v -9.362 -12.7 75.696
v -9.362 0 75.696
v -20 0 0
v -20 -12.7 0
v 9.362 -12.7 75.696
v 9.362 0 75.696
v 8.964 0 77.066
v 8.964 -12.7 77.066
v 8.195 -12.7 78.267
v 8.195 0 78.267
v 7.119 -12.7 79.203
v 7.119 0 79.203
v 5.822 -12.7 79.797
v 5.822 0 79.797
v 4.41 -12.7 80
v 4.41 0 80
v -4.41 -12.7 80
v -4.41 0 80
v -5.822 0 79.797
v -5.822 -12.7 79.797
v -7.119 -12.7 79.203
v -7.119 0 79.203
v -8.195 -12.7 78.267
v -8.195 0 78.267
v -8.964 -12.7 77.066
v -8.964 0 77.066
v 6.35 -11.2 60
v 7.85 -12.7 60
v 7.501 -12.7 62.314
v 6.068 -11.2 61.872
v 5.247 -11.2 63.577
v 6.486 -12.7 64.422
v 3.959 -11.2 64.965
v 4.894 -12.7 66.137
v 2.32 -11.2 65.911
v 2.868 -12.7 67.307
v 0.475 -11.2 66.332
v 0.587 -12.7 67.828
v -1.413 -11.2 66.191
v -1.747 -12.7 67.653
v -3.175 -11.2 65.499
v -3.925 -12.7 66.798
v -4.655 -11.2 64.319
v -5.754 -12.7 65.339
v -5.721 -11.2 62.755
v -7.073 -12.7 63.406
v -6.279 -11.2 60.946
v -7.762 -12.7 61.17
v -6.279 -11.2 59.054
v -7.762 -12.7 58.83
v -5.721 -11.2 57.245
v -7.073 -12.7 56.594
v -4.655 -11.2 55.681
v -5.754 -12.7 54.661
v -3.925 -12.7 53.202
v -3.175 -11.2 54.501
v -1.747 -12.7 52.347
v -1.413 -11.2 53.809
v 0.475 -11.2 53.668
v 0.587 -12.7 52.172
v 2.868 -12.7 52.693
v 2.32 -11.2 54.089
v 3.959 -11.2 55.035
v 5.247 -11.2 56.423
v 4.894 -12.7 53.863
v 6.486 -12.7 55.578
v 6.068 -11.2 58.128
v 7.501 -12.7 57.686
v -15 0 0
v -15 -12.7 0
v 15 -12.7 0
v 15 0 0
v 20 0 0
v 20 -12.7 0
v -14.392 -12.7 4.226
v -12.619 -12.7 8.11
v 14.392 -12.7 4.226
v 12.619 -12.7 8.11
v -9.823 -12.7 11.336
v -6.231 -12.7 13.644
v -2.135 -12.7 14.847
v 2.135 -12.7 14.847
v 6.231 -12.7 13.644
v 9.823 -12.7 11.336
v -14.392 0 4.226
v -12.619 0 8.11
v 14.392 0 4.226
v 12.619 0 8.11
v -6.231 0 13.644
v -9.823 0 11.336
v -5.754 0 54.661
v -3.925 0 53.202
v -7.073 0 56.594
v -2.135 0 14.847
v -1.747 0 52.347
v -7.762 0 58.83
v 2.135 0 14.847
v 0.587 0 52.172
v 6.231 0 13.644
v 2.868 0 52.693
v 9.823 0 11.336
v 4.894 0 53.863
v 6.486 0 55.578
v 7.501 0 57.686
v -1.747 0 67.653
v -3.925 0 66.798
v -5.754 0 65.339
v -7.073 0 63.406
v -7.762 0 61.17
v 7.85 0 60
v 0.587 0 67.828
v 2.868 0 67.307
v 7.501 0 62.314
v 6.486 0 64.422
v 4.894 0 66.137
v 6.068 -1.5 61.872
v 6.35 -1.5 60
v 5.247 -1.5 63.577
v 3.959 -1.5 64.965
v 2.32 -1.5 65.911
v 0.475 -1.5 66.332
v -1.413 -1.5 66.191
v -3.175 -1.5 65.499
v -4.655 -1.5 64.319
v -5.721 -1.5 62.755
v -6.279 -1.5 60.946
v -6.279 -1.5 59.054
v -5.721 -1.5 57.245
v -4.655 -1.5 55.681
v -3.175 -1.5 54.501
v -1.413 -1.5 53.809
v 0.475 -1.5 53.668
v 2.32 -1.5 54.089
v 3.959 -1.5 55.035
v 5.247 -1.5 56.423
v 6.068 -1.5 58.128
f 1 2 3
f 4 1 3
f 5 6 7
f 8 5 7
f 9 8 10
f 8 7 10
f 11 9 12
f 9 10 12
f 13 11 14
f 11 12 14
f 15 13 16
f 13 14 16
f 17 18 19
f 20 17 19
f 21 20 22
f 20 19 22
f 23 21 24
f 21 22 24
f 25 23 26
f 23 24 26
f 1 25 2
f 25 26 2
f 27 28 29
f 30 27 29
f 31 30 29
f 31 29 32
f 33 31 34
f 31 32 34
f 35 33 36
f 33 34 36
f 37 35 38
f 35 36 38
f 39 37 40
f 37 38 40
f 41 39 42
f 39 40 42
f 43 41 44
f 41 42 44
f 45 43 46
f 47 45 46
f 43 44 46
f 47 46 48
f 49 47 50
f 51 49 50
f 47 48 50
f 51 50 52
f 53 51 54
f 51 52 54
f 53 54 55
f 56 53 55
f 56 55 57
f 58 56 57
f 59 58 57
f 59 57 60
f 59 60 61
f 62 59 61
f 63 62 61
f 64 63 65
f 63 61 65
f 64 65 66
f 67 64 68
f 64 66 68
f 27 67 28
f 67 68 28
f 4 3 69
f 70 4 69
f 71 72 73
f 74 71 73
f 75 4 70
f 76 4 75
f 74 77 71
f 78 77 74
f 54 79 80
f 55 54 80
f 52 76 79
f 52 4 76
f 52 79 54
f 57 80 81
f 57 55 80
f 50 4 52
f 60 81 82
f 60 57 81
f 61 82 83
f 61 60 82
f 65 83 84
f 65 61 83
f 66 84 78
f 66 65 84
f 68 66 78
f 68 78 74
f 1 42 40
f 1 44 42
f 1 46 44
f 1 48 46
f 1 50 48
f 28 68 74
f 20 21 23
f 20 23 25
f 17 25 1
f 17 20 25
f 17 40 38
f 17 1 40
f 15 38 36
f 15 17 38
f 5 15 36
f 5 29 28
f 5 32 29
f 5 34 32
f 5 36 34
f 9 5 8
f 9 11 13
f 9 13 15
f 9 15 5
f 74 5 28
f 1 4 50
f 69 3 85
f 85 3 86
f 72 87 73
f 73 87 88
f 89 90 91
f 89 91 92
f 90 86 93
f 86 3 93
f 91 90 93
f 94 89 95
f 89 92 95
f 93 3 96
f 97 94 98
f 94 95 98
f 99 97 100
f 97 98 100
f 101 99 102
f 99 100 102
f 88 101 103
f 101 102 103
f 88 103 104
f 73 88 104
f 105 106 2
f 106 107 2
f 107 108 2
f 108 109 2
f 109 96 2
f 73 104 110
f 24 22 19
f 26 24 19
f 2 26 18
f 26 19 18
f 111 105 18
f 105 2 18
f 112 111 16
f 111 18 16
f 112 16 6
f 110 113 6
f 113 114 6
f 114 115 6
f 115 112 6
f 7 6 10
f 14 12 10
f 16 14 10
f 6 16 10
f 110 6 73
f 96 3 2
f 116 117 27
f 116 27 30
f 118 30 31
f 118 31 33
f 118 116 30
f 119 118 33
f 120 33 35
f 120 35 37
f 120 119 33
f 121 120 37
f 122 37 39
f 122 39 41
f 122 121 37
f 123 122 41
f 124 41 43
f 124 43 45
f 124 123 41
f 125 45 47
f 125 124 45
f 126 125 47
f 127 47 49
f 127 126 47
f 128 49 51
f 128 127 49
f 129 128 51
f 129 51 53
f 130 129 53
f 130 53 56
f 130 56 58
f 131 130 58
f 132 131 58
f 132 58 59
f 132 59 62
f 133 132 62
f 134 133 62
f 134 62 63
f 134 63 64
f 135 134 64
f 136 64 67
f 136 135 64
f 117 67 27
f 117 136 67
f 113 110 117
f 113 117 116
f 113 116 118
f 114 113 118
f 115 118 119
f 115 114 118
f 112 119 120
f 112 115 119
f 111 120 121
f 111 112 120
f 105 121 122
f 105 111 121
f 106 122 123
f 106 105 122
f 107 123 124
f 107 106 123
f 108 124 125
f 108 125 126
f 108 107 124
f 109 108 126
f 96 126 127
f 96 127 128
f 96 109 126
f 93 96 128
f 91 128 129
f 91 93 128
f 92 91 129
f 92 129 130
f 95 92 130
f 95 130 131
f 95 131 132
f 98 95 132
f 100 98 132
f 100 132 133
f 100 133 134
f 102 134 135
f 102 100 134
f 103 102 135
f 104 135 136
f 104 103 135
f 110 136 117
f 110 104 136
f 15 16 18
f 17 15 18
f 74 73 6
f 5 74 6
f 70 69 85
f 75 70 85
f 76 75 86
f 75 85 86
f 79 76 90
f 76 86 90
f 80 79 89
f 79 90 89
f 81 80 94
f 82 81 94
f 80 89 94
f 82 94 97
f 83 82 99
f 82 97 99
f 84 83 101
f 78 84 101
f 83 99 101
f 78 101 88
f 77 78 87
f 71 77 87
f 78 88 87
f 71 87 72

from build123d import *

# Parameters (mm, degrees)
F0_R     = 6.35
F1_DEPTH = 12.7
F2_SIZE  = 1.5


with BuildPart() as f1:
    # F0 (on Front) → F1 (new body)
    with BuildSketch(Plane.XZ):
        with BuildLine():
            Line((20, 0), (9.36164, 75.695866))
            ThreePointArc((9.36164, 75.695866), (7.690595, 78.773548), (4.4103, 80))
            Line((4.4103, 80), (-4.4103, 80))
            ThreePointArc((-4.4103, 80), (-7.690595, 78.773548), (-9.36164, 75.695866))
            Line((-9.36164, 75.695866), (-20, 0))
            Line((-20, 0), (-15, 0))
            ThreePointArc((-15, 0), (0, 15), (15, 0))
            Line((15, 0), (20, 0))
        make_face()
        with Locations((0, 60)):
            Circle(F0_R, mode=Mode.SUBTRACT)
    extrude(amount=F1_DEPTH)

    # F2
    f2_edges = [f1.edges().sort_by_distance(p)[0] for p in [
        (-6.35, -12.7, 60),
        (-6.35, 0, 60),
    ]]
    chamfer(f2_edges, length=F2_SIZE)


solid = f1.part
